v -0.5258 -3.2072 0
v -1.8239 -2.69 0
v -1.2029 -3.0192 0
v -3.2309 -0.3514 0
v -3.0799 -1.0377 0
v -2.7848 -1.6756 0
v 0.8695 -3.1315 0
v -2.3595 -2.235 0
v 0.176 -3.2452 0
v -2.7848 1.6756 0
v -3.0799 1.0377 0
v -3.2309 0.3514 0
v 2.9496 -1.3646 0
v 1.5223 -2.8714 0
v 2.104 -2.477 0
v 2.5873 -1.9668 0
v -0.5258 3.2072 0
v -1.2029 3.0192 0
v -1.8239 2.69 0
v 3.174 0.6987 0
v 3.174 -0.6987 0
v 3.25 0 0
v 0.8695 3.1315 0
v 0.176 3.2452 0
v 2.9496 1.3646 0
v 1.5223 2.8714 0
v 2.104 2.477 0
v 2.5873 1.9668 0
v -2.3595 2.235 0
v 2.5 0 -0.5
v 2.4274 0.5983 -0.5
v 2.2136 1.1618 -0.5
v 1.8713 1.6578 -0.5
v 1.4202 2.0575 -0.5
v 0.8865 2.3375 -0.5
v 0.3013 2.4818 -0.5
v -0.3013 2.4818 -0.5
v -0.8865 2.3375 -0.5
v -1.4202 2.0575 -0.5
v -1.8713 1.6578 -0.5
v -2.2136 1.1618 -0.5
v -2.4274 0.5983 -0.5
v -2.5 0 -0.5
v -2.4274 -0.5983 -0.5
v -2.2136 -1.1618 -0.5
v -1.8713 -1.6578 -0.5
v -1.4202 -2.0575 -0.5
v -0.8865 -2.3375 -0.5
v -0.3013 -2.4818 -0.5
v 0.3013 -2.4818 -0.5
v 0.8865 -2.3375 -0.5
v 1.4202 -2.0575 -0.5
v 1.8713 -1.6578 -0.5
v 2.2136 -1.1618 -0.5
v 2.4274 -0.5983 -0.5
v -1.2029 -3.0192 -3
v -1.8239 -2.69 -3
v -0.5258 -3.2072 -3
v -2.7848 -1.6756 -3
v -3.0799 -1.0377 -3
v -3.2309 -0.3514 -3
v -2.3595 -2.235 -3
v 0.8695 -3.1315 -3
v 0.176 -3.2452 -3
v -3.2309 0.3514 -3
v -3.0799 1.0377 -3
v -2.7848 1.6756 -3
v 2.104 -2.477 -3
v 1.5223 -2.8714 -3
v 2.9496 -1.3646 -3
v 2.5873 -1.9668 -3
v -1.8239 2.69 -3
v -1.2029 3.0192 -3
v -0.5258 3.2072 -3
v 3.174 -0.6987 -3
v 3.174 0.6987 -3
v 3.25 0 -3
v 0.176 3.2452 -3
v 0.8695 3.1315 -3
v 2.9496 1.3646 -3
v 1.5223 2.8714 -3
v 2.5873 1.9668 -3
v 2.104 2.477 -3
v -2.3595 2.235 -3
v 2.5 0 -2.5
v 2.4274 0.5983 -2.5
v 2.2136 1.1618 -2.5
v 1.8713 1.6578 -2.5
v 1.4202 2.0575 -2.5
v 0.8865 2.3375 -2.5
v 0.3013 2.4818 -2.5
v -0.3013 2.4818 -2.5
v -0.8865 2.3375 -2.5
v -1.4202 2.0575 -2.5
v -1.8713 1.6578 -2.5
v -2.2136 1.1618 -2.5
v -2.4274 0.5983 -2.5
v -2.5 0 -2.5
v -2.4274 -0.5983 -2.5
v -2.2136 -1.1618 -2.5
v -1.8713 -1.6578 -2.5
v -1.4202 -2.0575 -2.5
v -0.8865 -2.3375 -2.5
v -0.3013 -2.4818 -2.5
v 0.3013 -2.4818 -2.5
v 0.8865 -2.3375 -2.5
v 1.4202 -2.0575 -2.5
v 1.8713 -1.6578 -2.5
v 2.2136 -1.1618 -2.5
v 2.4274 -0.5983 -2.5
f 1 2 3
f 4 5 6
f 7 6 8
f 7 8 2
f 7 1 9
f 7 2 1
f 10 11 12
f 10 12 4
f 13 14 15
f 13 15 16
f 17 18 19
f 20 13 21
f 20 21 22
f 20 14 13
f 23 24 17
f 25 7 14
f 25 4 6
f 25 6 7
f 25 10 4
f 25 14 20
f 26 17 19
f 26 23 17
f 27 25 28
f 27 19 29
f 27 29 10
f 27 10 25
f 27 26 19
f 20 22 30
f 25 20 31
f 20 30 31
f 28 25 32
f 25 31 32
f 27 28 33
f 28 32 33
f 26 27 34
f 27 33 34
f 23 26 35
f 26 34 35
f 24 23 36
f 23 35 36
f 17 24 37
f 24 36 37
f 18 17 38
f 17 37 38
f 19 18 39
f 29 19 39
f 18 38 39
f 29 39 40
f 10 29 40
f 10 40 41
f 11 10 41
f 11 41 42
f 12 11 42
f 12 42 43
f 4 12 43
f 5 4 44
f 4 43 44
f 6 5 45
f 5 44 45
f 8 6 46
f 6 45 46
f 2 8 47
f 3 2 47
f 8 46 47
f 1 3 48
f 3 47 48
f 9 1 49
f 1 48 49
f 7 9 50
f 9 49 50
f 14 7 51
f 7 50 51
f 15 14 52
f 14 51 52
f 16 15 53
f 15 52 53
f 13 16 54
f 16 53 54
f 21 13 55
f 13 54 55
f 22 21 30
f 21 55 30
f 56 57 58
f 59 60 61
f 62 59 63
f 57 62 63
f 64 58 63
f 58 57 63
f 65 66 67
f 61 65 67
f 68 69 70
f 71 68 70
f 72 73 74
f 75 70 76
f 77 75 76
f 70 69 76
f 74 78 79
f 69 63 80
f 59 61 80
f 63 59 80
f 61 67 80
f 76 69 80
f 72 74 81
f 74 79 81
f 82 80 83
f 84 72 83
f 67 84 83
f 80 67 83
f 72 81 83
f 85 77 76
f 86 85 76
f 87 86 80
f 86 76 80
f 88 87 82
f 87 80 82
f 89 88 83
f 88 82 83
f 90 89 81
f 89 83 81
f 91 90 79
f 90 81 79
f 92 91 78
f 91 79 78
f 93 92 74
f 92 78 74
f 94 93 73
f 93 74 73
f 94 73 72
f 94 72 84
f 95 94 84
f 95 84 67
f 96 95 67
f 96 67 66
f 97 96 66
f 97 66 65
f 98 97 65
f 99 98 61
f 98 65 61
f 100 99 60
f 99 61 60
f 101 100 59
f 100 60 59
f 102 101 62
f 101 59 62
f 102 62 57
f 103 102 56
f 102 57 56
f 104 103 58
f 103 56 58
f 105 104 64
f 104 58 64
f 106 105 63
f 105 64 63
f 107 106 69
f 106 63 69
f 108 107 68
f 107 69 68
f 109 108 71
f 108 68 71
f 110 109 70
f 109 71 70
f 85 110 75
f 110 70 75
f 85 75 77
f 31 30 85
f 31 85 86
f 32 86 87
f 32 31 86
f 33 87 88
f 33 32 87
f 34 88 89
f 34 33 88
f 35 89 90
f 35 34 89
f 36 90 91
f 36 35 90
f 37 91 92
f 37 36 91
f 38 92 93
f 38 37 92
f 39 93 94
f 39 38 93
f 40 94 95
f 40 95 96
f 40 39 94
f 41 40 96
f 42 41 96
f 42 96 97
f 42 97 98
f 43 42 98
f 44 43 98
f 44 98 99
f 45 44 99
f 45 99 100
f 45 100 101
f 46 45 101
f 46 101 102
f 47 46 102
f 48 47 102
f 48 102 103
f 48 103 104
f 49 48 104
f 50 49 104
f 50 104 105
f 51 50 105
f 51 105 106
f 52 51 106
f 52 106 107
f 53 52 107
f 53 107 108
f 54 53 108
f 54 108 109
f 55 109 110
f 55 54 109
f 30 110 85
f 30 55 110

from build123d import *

# Parameters (mm, degrees)
F0_R     = 2.5
F1_DEPTH = 3
F2_START = -2.5
F0_R_2   = 3.25
F2_DEPTH = 0.5
F3_DEPTH = 0.5
F4_SIZE2 = 0.74999
F4_SIZE  = 0.49999
F5_SIZE2 = 0.49999
F5_SIZE  = 0.74999


# Not quite as in the source:
# - a fillet or chamfer is up to 0.001 mm smaller than in the source, because OpenCascade refuses the exact size


with BuildPart() as f1:
    # F0 (on Top) → F1 (new body)
    with BuildSketch(Plane.XY):
        Circle(F0_R)
    extrude(amount=-F1_DEPTH)

    # F0 (on Top) → F2 (join)
    with BuildSketch(Plane.XY.offset(F2_START)):
        Circle(F0_R_2)
        Circle(F0_R, mode=Mode.SUBTRACT)
    extrude(amount=-F2_DEPTH)

    # F0 (on Top) → F3 (join)
    with BuildSketch(Plane.XY):
        Circle(F0_R_2)
        Circle(F0_R, mode=Mode.SUBTRACT)
    extrude(amount=-F3_DEPTH)

    # F4 (size 0.5 and 0.75 in the source; OpenCascade refuses exactly that, so slightly less here)
    f4_edges = [f1.edges().sort_by_distance(p)[0] for p in [
        (-3.25, 0, -0.5),
    ]]
    f4_side = f1.faces().sort_by_distance((-3.25, 0, -0.25))[0]
    chamfer(f4_edges, length=F4_SIZE, length2=F4_SIZE2, reference=f4_side)

    # F5 (size 0.75 and 0.5 in the source; OpenCascade refuses exactly that, so slightly less here)
    f5_edges = [f1.edges().sort_by_distance(p)[0] for p in [
        (-3.25, 0, -2.5),
    ]]
    f5_side = f1.faces().sort_by_distance((-3.158076, 0, -2.5))[0]
    chamfer(f5_edges, length=F5_SIZE, length2=F5_SIZE2, reference=f5_side)


solid = f1.part
